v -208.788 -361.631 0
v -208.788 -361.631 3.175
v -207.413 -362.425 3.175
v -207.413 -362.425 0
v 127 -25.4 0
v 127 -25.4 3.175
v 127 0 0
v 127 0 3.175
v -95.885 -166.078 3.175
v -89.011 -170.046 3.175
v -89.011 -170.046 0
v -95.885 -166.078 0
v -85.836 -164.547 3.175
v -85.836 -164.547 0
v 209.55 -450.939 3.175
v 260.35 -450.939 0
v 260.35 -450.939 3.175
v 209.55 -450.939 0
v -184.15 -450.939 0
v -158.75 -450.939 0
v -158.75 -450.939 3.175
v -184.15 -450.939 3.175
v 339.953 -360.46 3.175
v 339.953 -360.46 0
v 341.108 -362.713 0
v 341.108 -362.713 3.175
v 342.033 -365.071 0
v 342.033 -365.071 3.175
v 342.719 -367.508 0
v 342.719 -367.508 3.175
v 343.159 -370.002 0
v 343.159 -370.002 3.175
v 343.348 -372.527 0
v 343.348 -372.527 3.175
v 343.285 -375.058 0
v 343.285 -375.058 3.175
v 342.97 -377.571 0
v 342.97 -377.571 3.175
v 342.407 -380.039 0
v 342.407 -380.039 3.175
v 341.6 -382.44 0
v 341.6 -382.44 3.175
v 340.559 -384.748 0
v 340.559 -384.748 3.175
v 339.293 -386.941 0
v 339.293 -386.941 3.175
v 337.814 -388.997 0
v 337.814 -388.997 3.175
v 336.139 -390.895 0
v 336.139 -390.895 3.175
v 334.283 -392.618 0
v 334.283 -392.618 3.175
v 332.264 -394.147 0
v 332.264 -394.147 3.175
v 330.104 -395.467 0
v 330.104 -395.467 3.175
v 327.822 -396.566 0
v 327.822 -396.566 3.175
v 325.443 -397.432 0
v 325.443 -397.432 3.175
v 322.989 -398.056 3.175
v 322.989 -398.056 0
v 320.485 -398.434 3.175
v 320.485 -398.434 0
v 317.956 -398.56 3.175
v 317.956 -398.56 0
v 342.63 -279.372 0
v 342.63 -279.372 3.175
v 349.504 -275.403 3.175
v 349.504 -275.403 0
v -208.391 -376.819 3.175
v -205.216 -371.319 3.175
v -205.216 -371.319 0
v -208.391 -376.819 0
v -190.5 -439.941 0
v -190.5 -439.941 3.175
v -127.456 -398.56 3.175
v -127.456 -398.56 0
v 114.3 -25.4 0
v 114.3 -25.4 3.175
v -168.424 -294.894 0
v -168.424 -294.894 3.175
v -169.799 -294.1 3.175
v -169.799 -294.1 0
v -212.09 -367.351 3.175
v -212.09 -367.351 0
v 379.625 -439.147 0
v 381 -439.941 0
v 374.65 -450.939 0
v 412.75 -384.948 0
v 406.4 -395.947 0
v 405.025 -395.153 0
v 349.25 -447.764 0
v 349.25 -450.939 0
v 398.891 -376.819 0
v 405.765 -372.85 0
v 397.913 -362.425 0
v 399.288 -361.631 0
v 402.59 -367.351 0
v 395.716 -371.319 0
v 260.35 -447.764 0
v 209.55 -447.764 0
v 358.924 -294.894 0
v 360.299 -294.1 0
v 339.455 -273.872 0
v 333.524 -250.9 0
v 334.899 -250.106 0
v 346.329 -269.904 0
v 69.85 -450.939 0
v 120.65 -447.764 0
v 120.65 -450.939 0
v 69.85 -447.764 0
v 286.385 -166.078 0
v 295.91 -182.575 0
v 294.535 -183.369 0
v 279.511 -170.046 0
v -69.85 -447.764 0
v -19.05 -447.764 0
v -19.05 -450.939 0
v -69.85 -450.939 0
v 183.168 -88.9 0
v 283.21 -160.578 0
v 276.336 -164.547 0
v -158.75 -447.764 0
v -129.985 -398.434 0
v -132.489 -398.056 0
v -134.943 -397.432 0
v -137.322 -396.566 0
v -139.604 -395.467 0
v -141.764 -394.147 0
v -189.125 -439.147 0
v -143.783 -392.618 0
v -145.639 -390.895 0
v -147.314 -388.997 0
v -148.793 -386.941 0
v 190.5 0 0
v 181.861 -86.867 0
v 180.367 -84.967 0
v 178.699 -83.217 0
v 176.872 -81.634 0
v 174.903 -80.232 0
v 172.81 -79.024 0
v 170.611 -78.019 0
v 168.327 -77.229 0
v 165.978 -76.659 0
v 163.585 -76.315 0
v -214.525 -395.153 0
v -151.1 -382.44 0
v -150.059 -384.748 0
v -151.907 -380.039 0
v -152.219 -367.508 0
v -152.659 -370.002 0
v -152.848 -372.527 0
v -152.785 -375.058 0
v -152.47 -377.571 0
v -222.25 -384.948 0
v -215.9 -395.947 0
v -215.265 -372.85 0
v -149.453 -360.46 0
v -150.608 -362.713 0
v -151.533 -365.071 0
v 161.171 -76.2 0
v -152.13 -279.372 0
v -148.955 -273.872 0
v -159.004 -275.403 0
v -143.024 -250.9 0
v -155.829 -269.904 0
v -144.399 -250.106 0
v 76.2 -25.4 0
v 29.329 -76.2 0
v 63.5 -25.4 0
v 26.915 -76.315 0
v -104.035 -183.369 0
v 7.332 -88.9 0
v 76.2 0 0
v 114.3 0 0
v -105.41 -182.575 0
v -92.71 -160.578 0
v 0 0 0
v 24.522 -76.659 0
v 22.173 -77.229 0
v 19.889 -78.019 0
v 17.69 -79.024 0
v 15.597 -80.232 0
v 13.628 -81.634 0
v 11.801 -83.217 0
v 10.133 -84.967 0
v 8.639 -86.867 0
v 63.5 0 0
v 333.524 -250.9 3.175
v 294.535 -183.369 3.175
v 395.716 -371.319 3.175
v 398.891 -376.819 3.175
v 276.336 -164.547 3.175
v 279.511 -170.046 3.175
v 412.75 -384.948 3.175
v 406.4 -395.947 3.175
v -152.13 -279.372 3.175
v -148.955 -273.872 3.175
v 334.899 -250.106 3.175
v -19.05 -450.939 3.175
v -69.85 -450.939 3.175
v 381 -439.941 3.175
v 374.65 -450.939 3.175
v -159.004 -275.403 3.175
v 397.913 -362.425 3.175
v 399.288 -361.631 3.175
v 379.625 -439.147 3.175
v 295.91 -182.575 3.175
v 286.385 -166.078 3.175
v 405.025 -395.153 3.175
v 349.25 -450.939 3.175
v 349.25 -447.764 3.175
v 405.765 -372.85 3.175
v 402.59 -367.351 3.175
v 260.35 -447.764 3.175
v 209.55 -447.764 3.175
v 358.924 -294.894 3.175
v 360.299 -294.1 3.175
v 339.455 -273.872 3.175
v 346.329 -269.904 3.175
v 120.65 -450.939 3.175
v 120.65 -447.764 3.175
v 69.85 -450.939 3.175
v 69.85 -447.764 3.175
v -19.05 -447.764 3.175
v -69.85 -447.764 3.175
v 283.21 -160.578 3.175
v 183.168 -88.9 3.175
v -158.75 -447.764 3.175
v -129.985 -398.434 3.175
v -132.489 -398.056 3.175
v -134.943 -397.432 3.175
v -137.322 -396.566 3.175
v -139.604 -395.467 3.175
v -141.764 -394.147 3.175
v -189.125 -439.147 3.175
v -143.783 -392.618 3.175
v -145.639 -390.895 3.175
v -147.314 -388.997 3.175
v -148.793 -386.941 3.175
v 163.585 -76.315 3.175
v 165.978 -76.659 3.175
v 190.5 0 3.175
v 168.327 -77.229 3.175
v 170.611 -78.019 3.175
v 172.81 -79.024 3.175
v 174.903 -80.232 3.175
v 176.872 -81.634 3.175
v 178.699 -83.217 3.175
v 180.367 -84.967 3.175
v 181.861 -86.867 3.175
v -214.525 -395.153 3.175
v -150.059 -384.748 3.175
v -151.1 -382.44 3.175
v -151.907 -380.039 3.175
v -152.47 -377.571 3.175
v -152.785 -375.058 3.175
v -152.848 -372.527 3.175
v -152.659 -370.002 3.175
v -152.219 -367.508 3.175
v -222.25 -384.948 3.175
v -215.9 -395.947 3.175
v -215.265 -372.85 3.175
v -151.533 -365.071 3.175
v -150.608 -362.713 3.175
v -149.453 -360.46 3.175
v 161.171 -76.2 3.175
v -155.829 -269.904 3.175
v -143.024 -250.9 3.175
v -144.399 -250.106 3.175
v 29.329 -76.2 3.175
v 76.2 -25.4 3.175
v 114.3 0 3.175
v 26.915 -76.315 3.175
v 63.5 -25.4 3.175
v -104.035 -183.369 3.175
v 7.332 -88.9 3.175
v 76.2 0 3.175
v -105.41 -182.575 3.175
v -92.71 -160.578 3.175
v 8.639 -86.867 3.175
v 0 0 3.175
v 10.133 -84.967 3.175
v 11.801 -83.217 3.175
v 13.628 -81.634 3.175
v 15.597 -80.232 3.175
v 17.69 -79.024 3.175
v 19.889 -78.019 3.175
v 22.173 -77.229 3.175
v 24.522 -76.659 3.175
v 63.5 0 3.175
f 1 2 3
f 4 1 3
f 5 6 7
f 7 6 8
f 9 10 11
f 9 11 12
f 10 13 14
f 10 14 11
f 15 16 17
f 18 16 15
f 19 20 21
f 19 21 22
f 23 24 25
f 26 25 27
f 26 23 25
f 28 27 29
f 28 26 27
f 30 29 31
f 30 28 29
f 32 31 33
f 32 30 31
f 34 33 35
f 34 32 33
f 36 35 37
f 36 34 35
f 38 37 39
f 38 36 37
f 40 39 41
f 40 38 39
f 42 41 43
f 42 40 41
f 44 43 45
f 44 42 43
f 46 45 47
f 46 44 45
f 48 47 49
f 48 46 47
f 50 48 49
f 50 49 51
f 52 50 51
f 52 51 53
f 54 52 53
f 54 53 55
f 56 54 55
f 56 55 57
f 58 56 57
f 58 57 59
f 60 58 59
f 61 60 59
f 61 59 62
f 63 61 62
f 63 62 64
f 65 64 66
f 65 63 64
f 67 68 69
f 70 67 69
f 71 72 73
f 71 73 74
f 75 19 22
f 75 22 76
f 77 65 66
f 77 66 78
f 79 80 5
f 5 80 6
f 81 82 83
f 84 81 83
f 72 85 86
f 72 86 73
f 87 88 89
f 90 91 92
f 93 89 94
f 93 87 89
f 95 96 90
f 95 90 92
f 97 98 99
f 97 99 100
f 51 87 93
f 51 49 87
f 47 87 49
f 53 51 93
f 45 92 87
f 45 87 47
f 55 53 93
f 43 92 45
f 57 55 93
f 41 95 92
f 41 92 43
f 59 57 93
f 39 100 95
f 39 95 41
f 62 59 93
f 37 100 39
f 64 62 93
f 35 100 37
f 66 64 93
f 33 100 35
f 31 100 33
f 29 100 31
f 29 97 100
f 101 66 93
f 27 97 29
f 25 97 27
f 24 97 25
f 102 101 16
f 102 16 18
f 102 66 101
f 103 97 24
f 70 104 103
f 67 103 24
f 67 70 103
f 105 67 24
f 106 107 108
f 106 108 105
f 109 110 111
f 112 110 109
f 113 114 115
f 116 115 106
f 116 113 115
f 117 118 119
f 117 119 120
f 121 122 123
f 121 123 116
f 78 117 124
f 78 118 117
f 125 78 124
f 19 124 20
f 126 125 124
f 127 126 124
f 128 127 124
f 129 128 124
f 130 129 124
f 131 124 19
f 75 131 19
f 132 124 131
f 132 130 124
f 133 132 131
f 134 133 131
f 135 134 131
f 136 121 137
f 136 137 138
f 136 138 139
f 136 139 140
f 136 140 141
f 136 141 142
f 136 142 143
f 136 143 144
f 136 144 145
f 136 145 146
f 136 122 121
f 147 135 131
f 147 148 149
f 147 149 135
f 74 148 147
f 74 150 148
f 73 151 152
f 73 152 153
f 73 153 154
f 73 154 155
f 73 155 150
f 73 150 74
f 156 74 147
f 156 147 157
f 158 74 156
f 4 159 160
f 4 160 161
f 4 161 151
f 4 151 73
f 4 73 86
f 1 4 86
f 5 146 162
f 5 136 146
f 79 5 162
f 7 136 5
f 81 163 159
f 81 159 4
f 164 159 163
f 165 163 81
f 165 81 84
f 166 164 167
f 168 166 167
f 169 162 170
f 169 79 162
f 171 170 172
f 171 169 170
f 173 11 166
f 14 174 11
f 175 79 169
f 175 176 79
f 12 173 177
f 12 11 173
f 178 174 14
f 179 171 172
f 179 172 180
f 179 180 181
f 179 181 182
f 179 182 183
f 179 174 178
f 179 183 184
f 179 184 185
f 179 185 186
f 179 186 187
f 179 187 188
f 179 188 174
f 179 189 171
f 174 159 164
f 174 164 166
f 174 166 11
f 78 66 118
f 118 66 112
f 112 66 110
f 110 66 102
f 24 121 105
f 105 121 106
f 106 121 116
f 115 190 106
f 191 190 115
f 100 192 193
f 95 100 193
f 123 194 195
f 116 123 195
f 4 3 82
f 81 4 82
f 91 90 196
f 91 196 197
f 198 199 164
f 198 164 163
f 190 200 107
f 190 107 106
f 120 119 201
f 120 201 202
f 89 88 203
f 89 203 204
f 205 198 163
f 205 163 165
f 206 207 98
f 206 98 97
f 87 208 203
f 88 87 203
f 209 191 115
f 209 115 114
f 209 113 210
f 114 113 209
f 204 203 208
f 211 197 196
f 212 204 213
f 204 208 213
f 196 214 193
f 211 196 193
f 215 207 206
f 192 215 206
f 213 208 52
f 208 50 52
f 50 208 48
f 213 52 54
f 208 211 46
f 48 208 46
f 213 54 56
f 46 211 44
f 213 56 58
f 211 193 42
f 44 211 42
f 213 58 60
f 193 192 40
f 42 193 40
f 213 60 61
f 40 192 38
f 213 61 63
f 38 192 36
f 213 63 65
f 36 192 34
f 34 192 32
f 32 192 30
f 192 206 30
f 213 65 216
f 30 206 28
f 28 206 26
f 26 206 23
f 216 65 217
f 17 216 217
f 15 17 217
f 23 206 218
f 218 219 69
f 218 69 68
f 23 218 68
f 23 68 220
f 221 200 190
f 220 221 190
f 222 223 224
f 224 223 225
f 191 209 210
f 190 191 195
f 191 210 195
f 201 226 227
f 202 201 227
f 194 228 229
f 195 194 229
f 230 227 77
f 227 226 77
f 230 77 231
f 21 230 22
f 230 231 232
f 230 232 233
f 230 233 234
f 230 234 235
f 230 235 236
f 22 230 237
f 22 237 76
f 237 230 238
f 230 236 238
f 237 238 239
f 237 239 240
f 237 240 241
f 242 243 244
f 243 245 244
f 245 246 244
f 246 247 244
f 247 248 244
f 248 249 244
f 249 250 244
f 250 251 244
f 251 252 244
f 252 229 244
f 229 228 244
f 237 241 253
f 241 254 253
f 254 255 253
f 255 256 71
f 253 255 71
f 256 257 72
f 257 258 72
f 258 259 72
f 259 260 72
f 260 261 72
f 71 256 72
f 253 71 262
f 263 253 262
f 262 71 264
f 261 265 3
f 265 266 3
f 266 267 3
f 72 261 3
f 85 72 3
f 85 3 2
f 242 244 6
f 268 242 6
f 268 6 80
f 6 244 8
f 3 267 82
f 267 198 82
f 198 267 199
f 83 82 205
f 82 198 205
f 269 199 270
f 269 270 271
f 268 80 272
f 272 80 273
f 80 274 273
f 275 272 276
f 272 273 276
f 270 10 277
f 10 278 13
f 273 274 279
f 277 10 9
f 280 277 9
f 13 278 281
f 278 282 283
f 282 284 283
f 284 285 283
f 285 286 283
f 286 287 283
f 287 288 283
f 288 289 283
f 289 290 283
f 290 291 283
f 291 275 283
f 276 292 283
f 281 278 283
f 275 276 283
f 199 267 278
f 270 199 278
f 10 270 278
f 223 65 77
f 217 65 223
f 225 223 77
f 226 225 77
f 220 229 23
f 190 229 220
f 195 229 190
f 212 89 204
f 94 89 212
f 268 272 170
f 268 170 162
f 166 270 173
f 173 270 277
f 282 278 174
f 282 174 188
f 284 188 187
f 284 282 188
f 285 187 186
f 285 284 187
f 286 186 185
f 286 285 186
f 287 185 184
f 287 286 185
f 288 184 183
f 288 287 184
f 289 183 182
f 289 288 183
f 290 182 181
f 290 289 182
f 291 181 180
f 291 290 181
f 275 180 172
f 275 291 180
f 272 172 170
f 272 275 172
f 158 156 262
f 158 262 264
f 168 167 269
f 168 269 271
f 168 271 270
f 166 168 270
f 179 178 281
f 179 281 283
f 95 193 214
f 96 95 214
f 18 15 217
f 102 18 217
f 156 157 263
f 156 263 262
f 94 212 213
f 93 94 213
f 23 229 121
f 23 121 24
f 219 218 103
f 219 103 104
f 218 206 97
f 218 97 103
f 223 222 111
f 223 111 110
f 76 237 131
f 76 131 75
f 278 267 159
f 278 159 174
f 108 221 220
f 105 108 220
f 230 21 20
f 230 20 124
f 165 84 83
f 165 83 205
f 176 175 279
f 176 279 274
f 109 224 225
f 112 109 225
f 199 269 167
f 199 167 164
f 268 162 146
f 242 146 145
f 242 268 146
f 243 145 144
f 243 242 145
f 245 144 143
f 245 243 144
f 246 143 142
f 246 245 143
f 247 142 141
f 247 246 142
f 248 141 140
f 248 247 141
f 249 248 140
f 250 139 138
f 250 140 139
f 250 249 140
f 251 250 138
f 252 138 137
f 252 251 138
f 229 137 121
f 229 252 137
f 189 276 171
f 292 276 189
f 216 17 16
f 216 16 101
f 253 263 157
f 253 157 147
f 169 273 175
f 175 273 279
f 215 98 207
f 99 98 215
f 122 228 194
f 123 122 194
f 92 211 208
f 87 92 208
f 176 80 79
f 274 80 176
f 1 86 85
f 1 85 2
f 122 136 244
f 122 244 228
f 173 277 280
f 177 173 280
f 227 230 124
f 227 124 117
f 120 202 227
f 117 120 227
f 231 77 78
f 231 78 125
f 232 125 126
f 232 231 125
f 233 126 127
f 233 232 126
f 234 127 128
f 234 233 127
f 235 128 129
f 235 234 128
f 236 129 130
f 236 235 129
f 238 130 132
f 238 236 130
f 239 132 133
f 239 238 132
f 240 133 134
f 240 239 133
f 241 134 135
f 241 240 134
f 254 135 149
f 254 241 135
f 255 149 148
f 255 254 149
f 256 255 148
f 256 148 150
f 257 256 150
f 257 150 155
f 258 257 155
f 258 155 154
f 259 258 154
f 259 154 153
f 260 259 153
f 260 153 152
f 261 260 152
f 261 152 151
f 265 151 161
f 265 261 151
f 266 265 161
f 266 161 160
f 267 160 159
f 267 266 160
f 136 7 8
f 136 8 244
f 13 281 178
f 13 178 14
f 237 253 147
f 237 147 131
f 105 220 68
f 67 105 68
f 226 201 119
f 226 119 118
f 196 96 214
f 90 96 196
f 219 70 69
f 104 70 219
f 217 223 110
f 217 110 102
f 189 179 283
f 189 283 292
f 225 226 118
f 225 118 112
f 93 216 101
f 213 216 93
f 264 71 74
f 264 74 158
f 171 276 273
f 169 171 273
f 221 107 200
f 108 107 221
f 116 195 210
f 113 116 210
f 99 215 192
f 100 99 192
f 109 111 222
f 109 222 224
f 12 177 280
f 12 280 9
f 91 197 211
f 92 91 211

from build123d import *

# Parameters (mm, degrees)
BOSS_EXTRUDE1_DEPTH = 3.175
SKETCH2_W           = 12.7
SKETCH2_H           = 25.4
CUT_EXTRUDE1_DEPTH  = 612.325617511
SKETCH4_W           = 88.9
SKETCH4_H           = 3.175
CUT_EXTRUDE2_DEPTH  = 612.325617511
CUT_EXTRUDE3_DEPTH  = 612.325617511
CUT_EXTRUDE4_DEPTH  = 612.325617511


with BuildPart() as part:
    # Sketch1 → Boss-Extrude1 (new body)
    with BuildSketch(Plane.XY):
        Polygon((0, 0), (190.5, 0), (412.75, -384.948291982), (374.65, -450.939427751), (-184.15, -450.939427751), (-222.25, -384.948291982), align=None)
    extrude(amount=BOSS_EXTRUDE1_DEPTH)

    # Sketch2 → Cut-Extrude1 (cut, through all)
    with BuildSketch(Plane.XY.offset(3.175)):
        with Locations((69.85, -12.7)):
            Rectangle(SKETCH2_W, SKETCH2_H)
        with BuildLine():
            Line((29.329393675, -76.2), (161.170606325, -76.2))
            ThreePointArc((161.170606325, -76.2), (173.870606325, -79.602954744), (183.167651581, -88.9))
            Line((183.167651581, -88.9), (339.952954744, -360.460110958))
            ThreePointArc((339.952954744, -360.460110958), (339.952954744, -385.860110958), (317.955909488, -398.560110958))
            Line((317.955909488, -398.560110958), (-127.455909488, -398.560110958))
            ThreePointArc((-127.455909488, -398.560110958), (-149.452954744, -385.860110958), (-149.452954744, -360.460110958))
            Line((-149.452954744, -360.460110958), (7.332348419, -88.9))
            ThreePointArc((7.332348419, -88.9), (16.629393675, -79.602954744), (29.329393675, -76.2))
        make_face()
        with Locations((120.65, -12.7)):
            Rectangle(SKETCH2_W, SKETCH2_H)
    extrude(amount=-CUT_EXTRUDE1_DEPTH, mode=Mode.SUBTRACT)

    # Sketch4 → Cut-Extrude2 (cut, through all)
    with BuildSketch(Plane.XY.offset(3.175)):
        with Locations((-114.3, -449.351927751)):
            Rectangle(SKETCH4_W, SKETCH4_H)
        with Locations((25.4, -449.351927751)):
            Rectangle(SKETCH4_W, SKETCH4_H)
        with Locations((165.1, -449.351927751)):
            Rectangle(SKETCH4_W, SKETCH4_H)
        with Locations((304.8, -449.351927751)):
            Rectangle(SKETCH4_W, SKETCH4_H)
        Polygon((-215.9, -395.94681461), (-214.525184671, -395.15306461), (-189.125184671, -439.147155122), (-190.5, -439.940905122), align=None)
        Polygon((406.4, -395.94681461), (405.025184671, -395.15306461), (379.625184671, -439.147155122), (381, -439.940905122), align=None)
    extrude(amount=-CUT_EXTRUDE2_DEPTH, mode=Mode.SUBTRACT)

    # Sketch5 → Cut-Extrude3 (cut, through all)
    with BuildSketch(Plane.XY.offset(3.175)):
        Polygon((-208.788, -361.631424011), (-207.413184671, -362.425174011), (-168.424184671, -294.894245074), (-169.799, -294.100495074), align=None)
        Polygon((-143.024184671, -250.900154562), (-104.035184671, -183.369225626), (-105.41, -182.575475626), (-144.399, -250.106404562), align=None)
        Polygon((399.288, -361.631424011), (397.913184671, -362.425174011), (358.924184671, -294.894245074), (360.299, -294.100495074), align=None)
        Polygon((334.899, -250.106404562), (333.524184671, -250.900154562), (294.535184671, -183.369225626), (295.91, -182.575475626), align=None)
    extrude(amount=-CUT_EXTRUDE3_DEPTH, mode=Mode.SUBTRACT)

    # Sketch6 → Cut-Extrude4 (cut, through all)
    with BuildSketch(Plane.XY.offset(3.175)):
        Polygon((-155.829, -269.903745293), (-148.954923357, -273.872495293), (-152.129923357, -279.371756607), (-159.004, -275.403006607), align=None)
        Polygon((349.504, -275.403006607), (346.329, -269.903745293), (339.454923357, -273.872495293), (342.629923357, -279.371756607), align=None)
        Polygon((-205.215923357, -371.319405777), (-208.390923357, -376.818667091), (-215.265, -372.849917091), (-212.09, -367.350655777), align=None)
        Polygon((-85.835923357, -164.54718037), (-89.010923357, -170.046441684), (-95.885, -166.077691684), (-92.71, -160.57843037), align=None)
        Polygon((286.385, -166.077691684), (283.21, -160.57843037), (276.335923357, -164.54718037), (279.510923357, -170.046441684), align=None)
        Polygon((405.765, -372.849917091), (402.59, -367.350655777), (395.715923357, -371.319405777), (398.890923357, -376.818667091), align=None)
    extrude(amount=-CUT_EXTRUDE4_DEPTH, mode=Mode.SUBTRACT)


solid = part.part
